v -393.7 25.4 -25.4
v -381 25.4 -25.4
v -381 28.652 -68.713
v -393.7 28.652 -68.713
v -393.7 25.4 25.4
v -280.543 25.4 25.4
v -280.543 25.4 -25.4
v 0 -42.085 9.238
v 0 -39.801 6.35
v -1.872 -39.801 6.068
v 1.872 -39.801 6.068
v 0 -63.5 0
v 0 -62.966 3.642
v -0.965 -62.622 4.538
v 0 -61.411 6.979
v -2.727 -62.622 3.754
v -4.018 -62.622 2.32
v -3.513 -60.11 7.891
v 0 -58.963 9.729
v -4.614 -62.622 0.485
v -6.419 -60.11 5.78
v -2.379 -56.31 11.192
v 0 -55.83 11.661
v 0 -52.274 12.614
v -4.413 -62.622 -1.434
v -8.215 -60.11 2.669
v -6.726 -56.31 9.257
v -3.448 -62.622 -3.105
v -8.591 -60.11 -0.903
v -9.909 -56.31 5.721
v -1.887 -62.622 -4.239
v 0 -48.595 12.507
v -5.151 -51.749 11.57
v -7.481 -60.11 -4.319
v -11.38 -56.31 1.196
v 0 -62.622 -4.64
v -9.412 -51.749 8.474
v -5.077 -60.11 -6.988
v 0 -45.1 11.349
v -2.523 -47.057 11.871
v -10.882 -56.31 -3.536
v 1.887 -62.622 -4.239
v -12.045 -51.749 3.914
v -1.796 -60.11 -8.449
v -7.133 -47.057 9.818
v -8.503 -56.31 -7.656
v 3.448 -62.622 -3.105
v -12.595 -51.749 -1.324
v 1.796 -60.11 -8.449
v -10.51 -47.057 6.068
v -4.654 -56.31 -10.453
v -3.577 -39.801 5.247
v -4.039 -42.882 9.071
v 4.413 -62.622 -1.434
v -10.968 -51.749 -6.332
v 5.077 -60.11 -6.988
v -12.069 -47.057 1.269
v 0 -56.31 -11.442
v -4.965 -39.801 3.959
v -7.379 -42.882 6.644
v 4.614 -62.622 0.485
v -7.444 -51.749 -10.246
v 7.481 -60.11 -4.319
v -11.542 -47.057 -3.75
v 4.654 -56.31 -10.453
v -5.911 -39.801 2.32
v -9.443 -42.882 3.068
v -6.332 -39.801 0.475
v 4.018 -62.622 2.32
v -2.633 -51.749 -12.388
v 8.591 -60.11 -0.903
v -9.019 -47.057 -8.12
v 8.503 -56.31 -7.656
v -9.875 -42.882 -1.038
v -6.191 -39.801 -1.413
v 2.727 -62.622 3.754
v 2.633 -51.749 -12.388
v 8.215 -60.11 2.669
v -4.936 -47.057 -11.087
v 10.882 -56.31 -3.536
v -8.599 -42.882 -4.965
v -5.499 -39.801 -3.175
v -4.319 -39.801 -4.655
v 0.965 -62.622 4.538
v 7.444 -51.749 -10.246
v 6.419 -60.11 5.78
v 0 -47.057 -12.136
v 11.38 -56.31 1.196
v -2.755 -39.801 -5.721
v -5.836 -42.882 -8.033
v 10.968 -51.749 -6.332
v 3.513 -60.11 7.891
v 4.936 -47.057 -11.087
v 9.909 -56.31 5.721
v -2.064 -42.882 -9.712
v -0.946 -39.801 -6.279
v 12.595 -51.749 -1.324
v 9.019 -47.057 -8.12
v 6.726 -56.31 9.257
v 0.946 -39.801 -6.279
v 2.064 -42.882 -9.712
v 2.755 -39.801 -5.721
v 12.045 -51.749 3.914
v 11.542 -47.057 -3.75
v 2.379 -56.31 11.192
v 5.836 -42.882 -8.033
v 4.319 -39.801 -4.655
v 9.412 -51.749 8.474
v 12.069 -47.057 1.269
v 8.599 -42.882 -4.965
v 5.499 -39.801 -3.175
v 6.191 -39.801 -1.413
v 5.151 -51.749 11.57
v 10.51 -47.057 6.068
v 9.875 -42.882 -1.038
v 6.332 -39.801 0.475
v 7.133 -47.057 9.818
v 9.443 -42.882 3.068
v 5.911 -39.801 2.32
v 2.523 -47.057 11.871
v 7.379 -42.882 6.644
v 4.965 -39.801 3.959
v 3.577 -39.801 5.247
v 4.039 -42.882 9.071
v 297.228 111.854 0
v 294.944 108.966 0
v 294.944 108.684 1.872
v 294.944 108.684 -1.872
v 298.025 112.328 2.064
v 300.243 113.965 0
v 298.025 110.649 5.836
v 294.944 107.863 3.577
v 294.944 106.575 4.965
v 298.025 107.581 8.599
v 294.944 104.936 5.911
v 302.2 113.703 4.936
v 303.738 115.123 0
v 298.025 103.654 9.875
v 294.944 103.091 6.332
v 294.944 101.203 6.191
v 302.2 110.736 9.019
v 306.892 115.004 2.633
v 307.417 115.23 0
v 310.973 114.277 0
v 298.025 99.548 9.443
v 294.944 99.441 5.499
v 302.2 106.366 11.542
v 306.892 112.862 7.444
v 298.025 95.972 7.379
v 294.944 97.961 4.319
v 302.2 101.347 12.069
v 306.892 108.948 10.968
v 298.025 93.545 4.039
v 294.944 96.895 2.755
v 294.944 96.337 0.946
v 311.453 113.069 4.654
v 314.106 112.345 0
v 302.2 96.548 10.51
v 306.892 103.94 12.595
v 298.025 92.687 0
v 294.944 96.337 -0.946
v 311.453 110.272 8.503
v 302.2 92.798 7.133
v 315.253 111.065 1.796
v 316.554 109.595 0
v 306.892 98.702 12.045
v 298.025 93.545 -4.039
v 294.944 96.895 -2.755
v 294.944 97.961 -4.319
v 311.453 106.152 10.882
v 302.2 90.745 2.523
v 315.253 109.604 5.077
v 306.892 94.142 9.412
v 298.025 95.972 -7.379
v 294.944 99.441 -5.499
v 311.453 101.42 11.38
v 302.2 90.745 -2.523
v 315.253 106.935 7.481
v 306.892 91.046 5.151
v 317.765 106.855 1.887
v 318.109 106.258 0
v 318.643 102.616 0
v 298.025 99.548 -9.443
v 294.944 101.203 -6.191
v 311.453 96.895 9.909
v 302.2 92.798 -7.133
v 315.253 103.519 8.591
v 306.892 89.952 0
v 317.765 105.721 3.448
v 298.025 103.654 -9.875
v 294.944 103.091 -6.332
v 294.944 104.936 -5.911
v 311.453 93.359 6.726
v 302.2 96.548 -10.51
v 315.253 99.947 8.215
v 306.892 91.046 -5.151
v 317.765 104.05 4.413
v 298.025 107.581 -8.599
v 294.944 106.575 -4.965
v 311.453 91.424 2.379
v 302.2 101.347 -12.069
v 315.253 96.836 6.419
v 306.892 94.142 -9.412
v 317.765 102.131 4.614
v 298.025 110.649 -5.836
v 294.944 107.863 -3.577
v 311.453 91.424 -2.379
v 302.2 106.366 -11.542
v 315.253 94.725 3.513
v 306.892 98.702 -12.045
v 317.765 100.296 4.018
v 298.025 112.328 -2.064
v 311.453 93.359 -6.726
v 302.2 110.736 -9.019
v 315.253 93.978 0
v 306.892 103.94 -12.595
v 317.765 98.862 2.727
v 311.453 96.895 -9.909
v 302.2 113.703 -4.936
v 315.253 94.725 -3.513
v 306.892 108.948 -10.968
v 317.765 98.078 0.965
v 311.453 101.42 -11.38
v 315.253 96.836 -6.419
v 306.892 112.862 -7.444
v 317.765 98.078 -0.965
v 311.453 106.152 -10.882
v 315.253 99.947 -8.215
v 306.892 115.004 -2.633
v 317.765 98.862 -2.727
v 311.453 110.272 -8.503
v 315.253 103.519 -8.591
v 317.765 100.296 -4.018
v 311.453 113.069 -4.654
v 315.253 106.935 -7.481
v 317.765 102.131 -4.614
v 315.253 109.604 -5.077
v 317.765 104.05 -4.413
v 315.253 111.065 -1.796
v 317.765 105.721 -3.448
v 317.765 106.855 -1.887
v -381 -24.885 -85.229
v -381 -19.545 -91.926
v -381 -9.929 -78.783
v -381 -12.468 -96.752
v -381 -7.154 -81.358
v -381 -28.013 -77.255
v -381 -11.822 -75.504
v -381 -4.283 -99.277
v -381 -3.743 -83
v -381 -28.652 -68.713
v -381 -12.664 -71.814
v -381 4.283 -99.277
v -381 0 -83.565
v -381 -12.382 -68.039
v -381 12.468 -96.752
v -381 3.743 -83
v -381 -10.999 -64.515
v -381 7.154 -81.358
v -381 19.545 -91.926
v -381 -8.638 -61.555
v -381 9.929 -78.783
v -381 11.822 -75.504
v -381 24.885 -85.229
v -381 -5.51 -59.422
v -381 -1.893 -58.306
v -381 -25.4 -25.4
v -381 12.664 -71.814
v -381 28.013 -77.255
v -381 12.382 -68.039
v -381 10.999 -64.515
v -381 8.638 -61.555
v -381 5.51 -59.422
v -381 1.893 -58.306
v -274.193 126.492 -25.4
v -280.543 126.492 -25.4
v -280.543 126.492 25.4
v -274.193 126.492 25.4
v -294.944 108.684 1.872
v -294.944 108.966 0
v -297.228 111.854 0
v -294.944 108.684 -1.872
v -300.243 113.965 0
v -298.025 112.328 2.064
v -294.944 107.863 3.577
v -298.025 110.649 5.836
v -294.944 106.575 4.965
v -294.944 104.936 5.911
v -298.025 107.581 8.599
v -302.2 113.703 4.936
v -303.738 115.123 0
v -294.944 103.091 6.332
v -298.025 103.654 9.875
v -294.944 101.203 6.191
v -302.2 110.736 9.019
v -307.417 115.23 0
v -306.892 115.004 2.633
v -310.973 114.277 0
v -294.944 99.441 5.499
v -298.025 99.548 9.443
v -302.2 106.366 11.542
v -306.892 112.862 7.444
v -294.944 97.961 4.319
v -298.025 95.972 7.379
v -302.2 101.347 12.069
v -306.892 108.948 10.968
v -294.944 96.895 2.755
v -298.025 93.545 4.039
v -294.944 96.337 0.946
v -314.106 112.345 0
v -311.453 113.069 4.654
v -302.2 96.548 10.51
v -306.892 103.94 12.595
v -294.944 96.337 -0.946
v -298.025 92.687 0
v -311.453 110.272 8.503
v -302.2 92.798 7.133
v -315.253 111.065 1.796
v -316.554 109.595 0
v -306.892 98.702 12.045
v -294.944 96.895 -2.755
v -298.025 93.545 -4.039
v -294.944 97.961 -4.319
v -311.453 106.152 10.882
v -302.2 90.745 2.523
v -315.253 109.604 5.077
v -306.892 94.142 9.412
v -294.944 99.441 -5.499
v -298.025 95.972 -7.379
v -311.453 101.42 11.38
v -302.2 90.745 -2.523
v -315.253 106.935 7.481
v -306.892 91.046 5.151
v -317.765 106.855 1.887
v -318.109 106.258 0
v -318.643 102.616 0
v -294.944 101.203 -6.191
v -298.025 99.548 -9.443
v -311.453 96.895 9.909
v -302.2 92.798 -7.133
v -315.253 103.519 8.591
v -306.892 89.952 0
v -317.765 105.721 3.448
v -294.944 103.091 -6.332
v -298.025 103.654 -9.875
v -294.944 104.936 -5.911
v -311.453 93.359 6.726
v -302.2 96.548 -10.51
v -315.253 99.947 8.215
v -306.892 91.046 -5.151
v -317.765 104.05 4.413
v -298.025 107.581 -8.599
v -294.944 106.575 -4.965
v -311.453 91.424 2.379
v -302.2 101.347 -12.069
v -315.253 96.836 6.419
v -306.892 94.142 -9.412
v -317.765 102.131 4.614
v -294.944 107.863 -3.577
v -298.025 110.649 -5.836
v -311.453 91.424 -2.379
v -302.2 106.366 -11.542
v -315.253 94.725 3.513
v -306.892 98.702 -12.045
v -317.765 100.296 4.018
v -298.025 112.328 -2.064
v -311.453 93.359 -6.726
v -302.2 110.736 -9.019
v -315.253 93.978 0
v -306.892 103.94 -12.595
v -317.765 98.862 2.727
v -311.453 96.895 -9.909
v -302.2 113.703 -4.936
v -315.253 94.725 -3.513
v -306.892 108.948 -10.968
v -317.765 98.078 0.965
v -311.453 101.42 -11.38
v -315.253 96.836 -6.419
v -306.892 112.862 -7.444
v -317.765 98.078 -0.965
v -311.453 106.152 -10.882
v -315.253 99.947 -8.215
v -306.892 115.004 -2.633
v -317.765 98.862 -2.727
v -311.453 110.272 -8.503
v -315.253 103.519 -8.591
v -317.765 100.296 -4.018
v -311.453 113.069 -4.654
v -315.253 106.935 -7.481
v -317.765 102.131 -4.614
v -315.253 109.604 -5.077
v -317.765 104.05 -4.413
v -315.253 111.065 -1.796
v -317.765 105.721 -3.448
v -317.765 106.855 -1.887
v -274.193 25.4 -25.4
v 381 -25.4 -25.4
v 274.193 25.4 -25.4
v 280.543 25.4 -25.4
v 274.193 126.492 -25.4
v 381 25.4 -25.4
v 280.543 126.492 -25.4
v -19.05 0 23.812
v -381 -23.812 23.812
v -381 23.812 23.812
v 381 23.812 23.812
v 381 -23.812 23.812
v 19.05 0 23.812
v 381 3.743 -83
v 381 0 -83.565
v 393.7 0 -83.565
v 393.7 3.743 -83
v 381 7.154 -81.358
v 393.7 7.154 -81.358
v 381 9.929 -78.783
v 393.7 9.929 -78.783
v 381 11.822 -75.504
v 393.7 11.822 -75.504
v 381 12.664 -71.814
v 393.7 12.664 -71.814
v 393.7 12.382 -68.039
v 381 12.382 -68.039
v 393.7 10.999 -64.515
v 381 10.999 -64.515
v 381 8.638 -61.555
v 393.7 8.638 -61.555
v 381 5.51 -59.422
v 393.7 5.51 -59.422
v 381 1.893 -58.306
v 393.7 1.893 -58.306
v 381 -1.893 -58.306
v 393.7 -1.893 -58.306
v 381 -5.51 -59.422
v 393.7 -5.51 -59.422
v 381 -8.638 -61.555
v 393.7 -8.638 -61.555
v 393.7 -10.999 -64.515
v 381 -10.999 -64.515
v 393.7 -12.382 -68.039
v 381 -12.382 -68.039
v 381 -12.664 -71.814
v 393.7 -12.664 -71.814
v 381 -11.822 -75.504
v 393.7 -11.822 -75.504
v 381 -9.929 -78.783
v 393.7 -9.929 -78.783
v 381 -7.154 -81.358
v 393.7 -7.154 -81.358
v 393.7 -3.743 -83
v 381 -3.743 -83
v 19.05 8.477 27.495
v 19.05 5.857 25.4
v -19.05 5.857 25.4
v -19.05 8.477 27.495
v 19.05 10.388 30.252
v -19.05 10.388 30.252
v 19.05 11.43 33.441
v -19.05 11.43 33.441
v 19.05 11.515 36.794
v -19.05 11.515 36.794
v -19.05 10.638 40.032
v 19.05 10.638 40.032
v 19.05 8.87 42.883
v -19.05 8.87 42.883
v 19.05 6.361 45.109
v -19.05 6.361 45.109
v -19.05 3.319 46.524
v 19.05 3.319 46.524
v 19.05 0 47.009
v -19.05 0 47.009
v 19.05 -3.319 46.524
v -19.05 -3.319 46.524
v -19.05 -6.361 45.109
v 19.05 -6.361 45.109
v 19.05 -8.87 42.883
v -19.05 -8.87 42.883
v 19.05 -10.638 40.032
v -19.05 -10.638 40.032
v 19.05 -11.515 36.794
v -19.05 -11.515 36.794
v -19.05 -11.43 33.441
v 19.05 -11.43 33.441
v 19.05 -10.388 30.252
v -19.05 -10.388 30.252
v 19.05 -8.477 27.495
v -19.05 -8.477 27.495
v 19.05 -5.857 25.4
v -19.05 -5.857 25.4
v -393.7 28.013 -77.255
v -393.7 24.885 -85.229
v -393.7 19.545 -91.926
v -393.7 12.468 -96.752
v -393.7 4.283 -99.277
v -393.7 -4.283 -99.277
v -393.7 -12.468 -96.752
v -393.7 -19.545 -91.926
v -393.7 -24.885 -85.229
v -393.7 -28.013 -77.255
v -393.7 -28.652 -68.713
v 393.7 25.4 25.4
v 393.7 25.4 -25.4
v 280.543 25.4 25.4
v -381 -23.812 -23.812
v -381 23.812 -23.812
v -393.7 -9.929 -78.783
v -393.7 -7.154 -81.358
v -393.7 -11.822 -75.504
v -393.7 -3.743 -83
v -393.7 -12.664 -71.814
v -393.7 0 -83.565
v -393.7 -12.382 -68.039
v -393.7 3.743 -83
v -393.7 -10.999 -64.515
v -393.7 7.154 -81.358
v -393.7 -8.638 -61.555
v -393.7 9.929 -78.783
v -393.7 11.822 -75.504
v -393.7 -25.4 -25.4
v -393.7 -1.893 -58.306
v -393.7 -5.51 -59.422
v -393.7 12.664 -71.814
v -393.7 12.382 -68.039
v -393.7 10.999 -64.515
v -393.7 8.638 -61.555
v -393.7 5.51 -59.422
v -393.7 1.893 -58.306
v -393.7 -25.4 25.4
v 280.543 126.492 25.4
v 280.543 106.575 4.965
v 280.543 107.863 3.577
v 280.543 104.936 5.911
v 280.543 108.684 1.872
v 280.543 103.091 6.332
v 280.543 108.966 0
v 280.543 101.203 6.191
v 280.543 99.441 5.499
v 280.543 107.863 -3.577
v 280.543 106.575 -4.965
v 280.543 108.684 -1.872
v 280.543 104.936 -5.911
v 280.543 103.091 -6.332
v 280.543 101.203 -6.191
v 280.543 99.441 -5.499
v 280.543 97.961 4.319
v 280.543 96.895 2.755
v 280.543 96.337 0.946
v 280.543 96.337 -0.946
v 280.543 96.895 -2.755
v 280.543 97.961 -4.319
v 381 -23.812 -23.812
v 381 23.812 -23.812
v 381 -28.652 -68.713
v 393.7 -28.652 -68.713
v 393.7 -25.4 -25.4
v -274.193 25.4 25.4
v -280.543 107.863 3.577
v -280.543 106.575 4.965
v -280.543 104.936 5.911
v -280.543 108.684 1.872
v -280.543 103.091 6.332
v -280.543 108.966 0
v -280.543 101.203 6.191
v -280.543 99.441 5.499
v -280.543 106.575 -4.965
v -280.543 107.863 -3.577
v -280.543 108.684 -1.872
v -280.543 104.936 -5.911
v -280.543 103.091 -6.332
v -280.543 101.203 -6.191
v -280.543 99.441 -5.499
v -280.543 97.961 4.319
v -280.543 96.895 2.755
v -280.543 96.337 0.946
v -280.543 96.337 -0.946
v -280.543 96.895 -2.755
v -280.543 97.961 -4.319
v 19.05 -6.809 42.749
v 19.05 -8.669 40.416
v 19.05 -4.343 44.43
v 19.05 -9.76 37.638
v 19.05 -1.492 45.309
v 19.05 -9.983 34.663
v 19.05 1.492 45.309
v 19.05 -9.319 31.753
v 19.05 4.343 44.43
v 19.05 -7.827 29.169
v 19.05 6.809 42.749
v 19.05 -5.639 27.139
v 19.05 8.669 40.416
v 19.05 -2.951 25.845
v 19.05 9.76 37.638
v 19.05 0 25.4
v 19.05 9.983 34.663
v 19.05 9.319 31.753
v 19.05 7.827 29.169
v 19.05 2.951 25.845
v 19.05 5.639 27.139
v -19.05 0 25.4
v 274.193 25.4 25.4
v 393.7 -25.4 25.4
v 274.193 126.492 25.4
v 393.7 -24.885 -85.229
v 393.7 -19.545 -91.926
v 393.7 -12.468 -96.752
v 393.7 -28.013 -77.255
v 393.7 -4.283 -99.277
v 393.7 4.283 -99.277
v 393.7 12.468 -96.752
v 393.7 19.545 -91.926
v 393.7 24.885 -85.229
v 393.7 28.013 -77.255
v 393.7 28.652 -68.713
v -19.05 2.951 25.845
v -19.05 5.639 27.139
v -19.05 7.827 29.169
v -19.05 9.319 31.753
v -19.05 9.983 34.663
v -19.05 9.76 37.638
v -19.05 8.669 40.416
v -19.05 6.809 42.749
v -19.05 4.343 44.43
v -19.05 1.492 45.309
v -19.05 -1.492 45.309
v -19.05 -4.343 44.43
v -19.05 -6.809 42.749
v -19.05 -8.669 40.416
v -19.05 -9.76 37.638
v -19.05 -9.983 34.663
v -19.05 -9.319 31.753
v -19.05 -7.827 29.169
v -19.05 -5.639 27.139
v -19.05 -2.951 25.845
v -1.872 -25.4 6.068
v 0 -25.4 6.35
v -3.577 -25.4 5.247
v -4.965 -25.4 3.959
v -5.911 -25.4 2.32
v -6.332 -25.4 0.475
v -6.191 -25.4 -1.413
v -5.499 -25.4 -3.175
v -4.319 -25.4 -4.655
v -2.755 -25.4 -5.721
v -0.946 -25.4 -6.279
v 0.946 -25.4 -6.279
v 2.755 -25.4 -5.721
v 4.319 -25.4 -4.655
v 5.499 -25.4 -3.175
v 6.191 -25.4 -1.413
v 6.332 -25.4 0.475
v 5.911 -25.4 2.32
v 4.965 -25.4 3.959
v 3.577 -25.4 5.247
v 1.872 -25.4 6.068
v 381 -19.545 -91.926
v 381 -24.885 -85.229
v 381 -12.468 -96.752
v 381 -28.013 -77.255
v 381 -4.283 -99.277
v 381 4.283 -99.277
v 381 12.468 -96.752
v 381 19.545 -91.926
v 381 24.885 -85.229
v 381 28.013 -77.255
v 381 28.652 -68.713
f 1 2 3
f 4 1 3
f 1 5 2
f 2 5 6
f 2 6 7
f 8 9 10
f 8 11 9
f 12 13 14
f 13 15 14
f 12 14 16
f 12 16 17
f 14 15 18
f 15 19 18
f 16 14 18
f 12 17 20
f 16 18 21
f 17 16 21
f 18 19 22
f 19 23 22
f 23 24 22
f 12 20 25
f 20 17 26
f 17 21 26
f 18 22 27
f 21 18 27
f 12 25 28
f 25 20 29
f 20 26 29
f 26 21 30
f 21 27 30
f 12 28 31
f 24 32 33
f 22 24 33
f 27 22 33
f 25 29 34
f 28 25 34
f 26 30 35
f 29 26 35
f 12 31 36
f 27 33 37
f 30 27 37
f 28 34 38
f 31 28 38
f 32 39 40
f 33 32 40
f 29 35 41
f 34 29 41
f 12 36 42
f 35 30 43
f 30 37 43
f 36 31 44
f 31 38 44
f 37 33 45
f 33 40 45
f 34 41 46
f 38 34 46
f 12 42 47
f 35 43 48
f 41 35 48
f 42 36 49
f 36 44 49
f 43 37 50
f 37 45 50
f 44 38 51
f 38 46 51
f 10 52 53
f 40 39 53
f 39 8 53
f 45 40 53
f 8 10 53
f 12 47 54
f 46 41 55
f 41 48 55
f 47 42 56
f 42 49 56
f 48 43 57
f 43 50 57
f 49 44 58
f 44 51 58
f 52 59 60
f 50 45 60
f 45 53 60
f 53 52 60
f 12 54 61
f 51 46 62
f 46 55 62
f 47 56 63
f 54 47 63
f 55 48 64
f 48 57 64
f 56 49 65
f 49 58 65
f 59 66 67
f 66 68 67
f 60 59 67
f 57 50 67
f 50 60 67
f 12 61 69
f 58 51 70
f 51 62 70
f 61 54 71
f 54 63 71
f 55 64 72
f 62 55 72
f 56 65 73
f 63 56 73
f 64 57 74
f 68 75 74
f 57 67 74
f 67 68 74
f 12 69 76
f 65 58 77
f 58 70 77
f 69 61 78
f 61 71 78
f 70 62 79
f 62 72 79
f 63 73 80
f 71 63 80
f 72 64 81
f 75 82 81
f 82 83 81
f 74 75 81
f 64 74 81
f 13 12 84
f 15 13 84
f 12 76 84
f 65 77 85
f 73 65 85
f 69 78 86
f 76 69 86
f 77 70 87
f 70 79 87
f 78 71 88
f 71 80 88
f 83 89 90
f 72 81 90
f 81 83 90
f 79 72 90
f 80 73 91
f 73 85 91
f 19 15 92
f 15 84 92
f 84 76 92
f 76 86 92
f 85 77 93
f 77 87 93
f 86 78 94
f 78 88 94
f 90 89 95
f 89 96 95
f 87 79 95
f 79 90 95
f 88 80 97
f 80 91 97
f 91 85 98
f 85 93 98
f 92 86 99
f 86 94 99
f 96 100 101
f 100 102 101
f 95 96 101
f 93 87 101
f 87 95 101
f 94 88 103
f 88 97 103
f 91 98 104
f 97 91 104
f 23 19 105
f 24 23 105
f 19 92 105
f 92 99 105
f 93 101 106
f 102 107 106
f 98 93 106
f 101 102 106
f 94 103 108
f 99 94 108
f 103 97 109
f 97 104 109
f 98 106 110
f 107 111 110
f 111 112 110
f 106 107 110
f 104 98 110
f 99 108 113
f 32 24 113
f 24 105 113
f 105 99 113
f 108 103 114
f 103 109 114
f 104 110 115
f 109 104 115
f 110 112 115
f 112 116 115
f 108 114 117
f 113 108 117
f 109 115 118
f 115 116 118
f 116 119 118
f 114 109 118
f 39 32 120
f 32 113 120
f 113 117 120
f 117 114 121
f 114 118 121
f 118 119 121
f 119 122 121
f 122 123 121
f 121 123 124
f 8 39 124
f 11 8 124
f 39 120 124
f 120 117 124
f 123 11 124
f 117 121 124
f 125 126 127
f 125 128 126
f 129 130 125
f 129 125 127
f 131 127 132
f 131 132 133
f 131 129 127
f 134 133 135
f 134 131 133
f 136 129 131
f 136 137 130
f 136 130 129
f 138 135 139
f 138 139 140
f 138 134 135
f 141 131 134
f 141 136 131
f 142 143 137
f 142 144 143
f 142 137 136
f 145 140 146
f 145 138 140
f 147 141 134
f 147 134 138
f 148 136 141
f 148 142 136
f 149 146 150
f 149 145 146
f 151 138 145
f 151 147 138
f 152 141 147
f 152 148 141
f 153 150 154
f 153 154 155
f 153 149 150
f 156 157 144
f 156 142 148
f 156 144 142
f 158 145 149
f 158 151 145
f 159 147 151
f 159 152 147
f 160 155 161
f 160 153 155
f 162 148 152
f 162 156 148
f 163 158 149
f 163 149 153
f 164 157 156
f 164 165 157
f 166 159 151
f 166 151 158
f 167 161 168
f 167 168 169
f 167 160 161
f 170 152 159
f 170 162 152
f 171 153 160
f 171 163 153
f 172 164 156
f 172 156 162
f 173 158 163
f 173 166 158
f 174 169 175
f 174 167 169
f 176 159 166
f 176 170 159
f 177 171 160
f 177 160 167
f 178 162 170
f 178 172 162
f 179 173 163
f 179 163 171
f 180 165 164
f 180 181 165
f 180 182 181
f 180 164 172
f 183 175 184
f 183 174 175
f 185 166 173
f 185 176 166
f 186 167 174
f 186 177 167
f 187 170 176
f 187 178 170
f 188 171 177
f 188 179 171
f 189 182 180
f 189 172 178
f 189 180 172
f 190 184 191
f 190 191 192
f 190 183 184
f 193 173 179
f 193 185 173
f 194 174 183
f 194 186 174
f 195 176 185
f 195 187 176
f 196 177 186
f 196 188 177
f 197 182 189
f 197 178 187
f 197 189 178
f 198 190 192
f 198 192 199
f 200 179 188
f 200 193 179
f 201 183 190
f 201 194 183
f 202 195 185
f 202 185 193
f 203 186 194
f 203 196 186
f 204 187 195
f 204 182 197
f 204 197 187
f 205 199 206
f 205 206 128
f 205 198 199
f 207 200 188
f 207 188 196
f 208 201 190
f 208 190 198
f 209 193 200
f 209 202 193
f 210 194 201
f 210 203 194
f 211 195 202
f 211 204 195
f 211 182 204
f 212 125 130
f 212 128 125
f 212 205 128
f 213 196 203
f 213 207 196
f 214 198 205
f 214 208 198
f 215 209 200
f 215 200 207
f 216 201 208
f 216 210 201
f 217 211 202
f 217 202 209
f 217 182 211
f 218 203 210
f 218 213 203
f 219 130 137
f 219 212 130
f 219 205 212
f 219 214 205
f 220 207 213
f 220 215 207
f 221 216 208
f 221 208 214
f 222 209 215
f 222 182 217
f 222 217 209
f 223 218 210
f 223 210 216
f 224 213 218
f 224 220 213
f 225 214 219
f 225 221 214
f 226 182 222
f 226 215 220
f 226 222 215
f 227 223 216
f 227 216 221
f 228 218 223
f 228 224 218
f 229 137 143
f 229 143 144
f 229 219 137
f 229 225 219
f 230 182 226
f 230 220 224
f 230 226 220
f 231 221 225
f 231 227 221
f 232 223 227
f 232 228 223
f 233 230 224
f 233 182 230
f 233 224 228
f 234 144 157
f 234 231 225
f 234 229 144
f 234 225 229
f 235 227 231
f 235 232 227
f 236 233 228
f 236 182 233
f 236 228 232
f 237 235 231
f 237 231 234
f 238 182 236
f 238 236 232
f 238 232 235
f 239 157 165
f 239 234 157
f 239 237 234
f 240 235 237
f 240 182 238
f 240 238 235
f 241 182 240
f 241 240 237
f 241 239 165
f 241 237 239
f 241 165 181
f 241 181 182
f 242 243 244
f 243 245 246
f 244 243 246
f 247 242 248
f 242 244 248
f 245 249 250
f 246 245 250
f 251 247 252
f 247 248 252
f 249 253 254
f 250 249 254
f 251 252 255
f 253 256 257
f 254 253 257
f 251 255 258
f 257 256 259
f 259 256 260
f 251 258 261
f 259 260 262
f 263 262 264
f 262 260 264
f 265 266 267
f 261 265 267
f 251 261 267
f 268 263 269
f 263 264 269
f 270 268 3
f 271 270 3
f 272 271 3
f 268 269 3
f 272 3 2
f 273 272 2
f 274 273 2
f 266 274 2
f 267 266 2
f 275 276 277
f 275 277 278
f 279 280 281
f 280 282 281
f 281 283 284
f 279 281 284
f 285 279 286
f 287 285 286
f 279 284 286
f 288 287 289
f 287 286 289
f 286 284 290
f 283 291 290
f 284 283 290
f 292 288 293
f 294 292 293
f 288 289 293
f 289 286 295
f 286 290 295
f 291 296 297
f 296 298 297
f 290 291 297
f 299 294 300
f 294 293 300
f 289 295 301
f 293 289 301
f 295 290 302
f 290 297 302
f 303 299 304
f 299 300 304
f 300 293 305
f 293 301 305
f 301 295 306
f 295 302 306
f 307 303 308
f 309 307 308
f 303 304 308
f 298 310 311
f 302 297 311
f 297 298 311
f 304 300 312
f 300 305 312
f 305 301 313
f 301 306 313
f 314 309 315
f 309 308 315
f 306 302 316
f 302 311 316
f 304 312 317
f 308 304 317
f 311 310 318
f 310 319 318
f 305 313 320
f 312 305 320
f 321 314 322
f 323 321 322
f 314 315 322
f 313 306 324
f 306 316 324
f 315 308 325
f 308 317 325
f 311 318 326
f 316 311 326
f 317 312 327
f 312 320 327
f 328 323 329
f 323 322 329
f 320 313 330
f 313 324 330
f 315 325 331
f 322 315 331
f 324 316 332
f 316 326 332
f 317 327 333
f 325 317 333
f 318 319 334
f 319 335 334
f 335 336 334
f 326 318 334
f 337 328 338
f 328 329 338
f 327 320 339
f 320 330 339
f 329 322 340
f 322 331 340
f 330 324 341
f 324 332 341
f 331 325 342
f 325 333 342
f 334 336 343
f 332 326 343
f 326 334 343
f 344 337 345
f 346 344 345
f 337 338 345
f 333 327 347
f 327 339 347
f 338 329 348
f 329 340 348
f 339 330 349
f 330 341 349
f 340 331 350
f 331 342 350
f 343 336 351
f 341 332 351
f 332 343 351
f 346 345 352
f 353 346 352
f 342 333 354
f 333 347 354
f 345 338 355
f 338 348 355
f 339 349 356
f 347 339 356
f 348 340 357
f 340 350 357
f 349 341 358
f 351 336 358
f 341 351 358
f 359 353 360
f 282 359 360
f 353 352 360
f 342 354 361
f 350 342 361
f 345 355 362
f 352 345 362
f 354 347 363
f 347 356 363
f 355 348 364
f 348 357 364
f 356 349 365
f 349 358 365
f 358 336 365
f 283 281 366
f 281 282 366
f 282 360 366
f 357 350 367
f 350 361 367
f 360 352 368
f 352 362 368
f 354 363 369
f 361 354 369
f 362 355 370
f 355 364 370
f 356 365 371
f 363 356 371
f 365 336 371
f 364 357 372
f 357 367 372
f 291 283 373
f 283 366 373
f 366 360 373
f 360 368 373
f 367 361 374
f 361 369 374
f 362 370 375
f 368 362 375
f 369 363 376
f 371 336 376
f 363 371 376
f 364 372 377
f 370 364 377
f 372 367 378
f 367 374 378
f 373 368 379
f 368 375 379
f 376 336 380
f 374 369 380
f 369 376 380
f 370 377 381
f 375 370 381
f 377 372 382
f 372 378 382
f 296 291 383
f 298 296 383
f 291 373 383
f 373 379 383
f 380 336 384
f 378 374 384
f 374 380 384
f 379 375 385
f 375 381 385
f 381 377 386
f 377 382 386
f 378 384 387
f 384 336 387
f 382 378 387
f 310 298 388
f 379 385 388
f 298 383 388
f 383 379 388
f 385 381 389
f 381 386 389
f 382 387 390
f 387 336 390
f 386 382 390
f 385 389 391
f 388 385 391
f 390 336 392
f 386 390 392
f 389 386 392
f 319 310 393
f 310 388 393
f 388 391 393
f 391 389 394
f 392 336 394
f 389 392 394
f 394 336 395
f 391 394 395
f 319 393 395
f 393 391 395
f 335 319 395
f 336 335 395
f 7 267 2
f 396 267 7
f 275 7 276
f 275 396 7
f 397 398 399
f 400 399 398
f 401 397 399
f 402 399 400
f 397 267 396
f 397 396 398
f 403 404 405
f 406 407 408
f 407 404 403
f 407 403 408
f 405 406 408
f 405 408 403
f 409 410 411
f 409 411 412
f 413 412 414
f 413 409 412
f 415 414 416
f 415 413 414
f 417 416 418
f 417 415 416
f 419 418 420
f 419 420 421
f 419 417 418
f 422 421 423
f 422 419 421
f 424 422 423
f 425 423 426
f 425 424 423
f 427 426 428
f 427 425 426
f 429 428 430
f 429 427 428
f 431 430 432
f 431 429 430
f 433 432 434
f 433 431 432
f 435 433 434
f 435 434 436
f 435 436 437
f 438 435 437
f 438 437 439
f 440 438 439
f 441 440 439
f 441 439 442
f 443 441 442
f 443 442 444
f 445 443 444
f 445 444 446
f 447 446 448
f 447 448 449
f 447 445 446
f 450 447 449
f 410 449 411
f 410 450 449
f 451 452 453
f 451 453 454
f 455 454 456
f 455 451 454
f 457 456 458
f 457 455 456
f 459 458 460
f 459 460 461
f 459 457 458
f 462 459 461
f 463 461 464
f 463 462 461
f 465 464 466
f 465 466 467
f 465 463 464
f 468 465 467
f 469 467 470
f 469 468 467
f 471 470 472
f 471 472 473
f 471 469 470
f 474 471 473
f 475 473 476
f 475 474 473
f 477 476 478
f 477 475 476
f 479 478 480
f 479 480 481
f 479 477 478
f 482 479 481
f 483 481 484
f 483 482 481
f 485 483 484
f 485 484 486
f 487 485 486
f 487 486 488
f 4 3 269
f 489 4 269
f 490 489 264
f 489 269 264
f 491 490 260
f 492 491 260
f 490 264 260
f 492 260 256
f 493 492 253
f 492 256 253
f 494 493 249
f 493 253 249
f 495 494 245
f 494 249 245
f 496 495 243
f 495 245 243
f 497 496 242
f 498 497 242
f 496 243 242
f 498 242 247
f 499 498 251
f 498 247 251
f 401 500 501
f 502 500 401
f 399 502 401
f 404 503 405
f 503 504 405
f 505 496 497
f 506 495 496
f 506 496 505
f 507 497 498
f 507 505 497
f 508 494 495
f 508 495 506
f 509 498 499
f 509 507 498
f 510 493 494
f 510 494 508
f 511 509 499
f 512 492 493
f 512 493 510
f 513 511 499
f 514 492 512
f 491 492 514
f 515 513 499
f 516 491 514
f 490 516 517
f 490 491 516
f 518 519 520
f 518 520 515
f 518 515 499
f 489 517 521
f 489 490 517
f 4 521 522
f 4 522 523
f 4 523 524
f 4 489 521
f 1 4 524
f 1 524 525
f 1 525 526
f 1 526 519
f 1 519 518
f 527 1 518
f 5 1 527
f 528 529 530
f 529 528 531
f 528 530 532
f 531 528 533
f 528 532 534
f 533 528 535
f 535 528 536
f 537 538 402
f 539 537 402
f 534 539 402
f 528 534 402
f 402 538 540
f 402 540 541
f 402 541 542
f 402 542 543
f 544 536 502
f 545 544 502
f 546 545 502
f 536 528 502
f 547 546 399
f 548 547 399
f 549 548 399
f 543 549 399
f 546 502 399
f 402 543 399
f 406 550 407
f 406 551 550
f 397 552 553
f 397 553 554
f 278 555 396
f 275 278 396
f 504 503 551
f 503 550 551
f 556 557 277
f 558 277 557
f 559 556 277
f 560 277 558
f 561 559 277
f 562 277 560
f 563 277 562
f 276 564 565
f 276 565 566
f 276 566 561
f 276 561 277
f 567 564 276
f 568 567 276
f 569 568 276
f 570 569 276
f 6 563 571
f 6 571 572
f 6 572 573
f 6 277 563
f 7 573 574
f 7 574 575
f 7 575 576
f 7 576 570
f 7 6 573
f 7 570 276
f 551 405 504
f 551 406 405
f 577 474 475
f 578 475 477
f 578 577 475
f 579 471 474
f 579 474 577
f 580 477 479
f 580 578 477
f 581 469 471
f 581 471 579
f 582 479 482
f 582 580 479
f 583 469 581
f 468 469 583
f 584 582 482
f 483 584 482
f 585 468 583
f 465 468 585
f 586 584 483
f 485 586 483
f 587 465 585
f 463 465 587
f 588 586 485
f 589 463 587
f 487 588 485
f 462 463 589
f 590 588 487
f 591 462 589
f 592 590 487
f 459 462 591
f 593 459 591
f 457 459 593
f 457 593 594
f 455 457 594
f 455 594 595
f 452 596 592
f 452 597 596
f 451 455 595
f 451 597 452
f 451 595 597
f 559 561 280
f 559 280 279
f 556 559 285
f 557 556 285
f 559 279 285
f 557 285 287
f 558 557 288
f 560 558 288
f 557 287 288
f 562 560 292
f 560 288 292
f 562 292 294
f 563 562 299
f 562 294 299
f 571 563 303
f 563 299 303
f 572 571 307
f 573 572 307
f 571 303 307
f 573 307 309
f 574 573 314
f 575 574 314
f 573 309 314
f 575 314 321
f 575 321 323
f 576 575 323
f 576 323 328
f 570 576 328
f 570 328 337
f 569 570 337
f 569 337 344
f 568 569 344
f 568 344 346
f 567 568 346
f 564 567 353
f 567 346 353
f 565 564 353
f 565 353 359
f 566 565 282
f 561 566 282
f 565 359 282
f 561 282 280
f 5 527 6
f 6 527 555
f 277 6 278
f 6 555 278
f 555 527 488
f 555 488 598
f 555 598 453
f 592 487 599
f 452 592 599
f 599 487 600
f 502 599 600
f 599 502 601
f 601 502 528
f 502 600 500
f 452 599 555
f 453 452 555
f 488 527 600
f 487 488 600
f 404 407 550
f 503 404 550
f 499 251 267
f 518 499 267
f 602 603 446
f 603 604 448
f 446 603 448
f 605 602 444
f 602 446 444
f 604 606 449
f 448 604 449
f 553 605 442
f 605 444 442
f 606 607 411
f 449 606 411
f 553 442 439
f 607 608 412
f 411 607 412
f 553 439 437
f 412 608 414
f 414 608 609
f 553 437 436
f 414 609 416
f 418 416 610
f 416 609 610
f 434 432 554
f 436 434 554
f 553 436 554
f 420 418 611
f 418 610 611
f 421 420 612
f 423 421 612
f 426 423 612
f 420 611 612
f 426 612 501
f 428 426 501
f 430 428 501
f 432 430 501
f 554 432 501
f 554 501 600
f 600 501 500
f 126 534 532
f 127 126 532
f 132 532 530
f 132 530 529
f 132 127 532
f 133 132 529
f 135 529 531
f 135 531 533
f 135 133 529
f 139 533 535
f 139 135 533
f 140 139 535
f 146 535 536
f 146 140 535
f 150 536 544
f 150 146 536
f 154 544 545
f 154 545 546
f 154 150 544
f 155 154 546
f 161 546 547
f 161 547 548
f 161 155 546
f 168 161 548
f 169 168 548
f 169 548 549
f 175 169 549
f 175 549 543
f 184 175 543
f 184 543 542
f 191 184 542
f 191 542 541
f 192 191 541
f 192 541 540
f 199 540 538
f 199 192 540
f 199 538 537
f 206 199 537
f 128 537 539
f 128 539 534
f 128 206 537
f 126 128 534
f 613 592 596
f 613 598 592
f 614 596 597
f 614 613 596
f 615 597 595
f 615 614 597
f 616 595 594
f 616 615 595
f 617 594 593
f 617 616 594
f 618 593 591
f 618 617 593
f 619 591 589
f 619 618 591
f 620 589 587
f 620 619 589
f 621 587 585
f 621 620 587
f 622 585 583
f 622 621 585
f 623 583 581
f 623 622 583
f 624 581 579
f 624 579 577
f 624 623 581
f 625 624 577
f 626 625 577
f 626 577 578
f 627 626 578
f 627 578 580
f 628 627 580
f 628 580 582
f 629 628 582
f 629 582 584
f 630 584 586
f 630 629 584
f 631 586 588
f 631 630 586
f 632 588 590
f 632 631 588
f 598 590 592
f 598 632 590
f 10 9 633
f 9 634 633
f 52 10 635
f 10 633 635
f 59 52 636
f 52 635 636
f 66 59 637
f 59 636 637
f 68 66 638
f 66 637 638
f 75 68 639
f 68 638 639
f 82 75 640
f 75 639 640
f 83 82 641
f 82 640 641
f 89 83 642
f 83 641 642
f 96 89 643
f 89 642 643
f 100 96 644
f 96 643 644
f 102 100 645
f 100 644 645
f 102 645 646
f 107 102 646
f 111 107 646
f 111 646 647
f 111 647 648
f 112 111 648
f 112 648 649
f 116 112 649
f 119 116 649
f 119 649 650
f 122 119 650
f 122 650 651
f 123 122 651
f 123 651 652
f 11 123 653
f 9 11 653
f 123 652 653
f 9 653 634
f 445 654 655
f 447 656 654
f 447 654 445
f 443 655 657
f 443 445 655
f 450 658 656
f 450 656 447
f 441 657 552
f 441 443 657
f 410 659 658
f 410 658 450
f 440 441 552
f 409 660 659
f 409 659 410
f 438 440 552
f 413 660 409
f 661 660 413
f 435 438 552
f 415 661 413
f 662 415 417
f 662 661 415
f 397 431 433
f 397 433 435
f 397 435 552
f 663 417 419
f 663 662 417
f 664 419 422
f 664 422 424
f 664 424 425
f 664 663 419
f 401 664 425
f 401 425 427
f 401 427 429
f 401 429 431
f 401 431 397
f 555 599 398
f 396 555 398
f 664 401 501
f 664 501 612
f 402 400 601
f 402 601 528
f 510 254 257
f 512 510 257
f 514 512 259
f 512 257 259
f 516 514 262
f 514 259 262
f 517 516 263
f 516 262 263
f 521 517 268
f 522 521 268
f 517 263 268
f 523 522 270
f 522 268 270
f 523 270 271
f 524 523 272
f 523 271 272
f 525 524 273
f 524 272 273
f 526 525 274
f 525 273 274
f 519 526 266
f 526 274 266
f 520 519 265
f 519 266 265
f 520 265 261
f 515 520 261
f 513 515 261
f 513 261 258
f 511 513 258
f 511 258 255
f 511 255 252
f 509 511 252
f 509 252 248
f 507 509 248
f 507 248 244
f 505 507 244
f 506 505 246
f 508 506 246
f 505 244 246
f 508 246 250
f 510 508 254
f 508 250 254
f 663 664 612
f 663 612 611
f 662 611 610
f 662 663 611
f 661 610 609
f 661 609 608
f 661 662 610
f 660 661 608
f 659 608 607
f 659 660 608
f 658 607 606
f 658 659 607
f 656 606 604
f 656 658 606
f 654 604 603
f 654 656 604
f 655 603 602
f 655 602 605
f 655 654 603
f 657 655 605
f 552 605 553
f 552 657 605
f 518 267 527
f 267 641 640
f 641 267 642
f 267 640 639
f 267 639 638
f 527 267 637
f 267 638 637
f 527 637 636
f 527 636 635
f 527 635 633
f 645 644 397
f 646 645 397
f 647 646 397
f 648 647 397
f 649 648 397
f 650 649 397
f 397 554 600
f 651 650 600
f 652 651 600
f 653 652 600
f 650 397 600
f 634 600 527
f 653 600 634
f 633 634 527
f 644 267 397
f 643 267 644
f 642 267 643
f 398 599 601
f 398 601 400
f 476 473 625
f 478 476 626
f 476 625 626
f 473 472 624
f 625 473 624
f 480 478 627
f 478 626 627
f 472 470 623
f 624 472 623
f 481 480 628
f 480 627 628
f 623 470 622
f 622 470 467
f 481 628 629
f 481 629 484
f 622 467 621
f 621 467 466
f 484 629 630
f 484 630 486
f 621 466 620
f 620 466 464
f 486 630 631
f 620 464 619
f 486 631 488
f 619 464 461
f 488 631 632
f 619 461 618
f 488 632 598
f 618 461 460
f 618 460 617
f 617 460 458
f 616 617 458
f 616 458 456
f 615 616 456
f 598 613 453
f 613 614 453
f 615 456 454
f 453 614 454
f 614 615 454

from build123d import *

# Parameters (mm, degrees)
SKETCH1_W           = 50.8
SKETCH1_H           = 50.8
SKETCH1_W_2         = 47.625
SKETCH1_H_2         = 47.625
BOSS_EXTRUDE1_DEPTH = 381
SKETCH2_R           = 11.598122223
SKETCH2_R_2         = 10.010622223
BOSS_EXTRUDE2_DEPTH = 19.05
SKETCH3_W           = 6.35
SKETCH3_H           = 50.8
BOSS_EXTRUDE3_DEPTH = 101.092
SKETCH7_R           = 12.7
BOSS_EXTRUDE4_DEPTH = 12.7


with BuildPart() as part:
    # Sketch1 → Boss-Extrude1 (new body, symmetric)
    with BuildSketch(Plane(origin=(0, 0, 0), x_dir=(0, 0, -1), z_dir=(1, 0, 0))):
        Rectangle(SKETCH1_W, SKETCH1_H)
        Rectangle(SKETCH1_W_2, SKETCH1_H_2, mode=Mode.SUBTRACT)
    extrude(amount=BOSS_EXTRUDE1_DEPTH, both=True)

    # Sketch2 → Boss-Extrude2 (add, symmetric)
    with BuildSketch(Plane(origin=(0, 0, 0), x_dir=(0, 0, -1), z_dir=(1, 0, 0))):
        with Locations((-35.410622223, 0)):
            Circle(SKETCH2_R)
        with Locations((-35.410622223, 0)):
            Circle(SKETCH2_R_2, mode=Mode.SUBTRACT)
    extrude(amount=BOSS_EXTRUDE2_DEPTH, both=True)

    # Sketch3 → Boss-Extrude3 (add)
    with BuildSketch(Plane(origin=(0, 25.4, 0), x_dir=(1, 0, 0), z_dir=(0, 1, 0))):
        with Locations((-277.368, 0)):
            Rectangle(SKETCH3_W, SKETCH3_H)
        with Locations((277.368, 0)):
            Rectangle(SKETCH3_W, SKETCH3_H)
    extrude(amount=BOSS_EXTRUDE3_DEPTH)

    # Sketch5 → Revolve1 (revolve)
    with BuildSketch(Plane.XY):
        with BuildLine():
            Line((280.543, 108.966), (294.944477372, 108.966))
            ThreePointArc((294.944477372, 108.966), (309.230001873, 114.883257994), (318.643, 102.616))
            Line((318.643, 102.616), (280.543, 102.616))
            Line((280.543, 102.616), (280.543, 108.966))
        make_face()
    revolve1 = revolve(axis=Axis((280.543, 102.616, 0), (1, 0, 0)))

    # Mirror1: Revolve1 across plane
    add(revolve1.mirror(Plane(origin=(0, 0, 0), x_dir=(0, 0, 1), z_dir=(1, 0, 0))))

    # Sketch6 → Revolve2 (revolve)
    with BuildSketch(Plane(origin=(0, 0, 0), x_dir=(0, 0, -1), z_dir=(1, 0, 0))):
        with BuildLine():
            Line((-6.35, -25.4), (0, -25.4))
            Line((0, -25.4), (0, -63.5))
            ThreePointArc((0, -63.5), (-12.267257994, -54.087001873), (-6.35, -39.801477372))
            Line((-6.35, -39.801477372), (-6.35, -25.4))
        make_face()
    revolve(axis=Axis((0, -25.4, 0), (0, -1, 0)))

    # Sketch7 → Boss-Extrude4 (add)
    with BuildSketch(Plane(origin=(381, 0, 0), x_dir=(0, 0, -1), z_dir=(1, 0, 0))):
        with BuildLine():
            Line((68.713128758, -28.652376301), (25.4, -25.4))
            Line((25.4, -25.4), (-25.4, -25.4))
            Line((-25.4, -25.4), (-25.4, 25.4))
            Line((-25.4, 25.4), (25.4, 25.4))
            Line((25.4, 25.4), (68.713128758, 28.6523763))
            ThreePointArc((68.713128758, 28.6523763), (99.597672127, 0), (68.713128758, -28.652376301))
        make_face()
        with Locations((70.86463137, 0)):
            Circle(SKETCH7_R, mode=Mode.SUBTRACT)
    boss_extrude4 = extrude(amount=BOSS_EXTRUDE4_DEPTH)

    # Mirror2: Boss-Extrude4 across plane
    add(boss_extrude4.mirror(Plane(origin=(0, 0, 0), x_dir=(0, 0, 1), z_dir=(1, 0, 0))))


solid = part.part
